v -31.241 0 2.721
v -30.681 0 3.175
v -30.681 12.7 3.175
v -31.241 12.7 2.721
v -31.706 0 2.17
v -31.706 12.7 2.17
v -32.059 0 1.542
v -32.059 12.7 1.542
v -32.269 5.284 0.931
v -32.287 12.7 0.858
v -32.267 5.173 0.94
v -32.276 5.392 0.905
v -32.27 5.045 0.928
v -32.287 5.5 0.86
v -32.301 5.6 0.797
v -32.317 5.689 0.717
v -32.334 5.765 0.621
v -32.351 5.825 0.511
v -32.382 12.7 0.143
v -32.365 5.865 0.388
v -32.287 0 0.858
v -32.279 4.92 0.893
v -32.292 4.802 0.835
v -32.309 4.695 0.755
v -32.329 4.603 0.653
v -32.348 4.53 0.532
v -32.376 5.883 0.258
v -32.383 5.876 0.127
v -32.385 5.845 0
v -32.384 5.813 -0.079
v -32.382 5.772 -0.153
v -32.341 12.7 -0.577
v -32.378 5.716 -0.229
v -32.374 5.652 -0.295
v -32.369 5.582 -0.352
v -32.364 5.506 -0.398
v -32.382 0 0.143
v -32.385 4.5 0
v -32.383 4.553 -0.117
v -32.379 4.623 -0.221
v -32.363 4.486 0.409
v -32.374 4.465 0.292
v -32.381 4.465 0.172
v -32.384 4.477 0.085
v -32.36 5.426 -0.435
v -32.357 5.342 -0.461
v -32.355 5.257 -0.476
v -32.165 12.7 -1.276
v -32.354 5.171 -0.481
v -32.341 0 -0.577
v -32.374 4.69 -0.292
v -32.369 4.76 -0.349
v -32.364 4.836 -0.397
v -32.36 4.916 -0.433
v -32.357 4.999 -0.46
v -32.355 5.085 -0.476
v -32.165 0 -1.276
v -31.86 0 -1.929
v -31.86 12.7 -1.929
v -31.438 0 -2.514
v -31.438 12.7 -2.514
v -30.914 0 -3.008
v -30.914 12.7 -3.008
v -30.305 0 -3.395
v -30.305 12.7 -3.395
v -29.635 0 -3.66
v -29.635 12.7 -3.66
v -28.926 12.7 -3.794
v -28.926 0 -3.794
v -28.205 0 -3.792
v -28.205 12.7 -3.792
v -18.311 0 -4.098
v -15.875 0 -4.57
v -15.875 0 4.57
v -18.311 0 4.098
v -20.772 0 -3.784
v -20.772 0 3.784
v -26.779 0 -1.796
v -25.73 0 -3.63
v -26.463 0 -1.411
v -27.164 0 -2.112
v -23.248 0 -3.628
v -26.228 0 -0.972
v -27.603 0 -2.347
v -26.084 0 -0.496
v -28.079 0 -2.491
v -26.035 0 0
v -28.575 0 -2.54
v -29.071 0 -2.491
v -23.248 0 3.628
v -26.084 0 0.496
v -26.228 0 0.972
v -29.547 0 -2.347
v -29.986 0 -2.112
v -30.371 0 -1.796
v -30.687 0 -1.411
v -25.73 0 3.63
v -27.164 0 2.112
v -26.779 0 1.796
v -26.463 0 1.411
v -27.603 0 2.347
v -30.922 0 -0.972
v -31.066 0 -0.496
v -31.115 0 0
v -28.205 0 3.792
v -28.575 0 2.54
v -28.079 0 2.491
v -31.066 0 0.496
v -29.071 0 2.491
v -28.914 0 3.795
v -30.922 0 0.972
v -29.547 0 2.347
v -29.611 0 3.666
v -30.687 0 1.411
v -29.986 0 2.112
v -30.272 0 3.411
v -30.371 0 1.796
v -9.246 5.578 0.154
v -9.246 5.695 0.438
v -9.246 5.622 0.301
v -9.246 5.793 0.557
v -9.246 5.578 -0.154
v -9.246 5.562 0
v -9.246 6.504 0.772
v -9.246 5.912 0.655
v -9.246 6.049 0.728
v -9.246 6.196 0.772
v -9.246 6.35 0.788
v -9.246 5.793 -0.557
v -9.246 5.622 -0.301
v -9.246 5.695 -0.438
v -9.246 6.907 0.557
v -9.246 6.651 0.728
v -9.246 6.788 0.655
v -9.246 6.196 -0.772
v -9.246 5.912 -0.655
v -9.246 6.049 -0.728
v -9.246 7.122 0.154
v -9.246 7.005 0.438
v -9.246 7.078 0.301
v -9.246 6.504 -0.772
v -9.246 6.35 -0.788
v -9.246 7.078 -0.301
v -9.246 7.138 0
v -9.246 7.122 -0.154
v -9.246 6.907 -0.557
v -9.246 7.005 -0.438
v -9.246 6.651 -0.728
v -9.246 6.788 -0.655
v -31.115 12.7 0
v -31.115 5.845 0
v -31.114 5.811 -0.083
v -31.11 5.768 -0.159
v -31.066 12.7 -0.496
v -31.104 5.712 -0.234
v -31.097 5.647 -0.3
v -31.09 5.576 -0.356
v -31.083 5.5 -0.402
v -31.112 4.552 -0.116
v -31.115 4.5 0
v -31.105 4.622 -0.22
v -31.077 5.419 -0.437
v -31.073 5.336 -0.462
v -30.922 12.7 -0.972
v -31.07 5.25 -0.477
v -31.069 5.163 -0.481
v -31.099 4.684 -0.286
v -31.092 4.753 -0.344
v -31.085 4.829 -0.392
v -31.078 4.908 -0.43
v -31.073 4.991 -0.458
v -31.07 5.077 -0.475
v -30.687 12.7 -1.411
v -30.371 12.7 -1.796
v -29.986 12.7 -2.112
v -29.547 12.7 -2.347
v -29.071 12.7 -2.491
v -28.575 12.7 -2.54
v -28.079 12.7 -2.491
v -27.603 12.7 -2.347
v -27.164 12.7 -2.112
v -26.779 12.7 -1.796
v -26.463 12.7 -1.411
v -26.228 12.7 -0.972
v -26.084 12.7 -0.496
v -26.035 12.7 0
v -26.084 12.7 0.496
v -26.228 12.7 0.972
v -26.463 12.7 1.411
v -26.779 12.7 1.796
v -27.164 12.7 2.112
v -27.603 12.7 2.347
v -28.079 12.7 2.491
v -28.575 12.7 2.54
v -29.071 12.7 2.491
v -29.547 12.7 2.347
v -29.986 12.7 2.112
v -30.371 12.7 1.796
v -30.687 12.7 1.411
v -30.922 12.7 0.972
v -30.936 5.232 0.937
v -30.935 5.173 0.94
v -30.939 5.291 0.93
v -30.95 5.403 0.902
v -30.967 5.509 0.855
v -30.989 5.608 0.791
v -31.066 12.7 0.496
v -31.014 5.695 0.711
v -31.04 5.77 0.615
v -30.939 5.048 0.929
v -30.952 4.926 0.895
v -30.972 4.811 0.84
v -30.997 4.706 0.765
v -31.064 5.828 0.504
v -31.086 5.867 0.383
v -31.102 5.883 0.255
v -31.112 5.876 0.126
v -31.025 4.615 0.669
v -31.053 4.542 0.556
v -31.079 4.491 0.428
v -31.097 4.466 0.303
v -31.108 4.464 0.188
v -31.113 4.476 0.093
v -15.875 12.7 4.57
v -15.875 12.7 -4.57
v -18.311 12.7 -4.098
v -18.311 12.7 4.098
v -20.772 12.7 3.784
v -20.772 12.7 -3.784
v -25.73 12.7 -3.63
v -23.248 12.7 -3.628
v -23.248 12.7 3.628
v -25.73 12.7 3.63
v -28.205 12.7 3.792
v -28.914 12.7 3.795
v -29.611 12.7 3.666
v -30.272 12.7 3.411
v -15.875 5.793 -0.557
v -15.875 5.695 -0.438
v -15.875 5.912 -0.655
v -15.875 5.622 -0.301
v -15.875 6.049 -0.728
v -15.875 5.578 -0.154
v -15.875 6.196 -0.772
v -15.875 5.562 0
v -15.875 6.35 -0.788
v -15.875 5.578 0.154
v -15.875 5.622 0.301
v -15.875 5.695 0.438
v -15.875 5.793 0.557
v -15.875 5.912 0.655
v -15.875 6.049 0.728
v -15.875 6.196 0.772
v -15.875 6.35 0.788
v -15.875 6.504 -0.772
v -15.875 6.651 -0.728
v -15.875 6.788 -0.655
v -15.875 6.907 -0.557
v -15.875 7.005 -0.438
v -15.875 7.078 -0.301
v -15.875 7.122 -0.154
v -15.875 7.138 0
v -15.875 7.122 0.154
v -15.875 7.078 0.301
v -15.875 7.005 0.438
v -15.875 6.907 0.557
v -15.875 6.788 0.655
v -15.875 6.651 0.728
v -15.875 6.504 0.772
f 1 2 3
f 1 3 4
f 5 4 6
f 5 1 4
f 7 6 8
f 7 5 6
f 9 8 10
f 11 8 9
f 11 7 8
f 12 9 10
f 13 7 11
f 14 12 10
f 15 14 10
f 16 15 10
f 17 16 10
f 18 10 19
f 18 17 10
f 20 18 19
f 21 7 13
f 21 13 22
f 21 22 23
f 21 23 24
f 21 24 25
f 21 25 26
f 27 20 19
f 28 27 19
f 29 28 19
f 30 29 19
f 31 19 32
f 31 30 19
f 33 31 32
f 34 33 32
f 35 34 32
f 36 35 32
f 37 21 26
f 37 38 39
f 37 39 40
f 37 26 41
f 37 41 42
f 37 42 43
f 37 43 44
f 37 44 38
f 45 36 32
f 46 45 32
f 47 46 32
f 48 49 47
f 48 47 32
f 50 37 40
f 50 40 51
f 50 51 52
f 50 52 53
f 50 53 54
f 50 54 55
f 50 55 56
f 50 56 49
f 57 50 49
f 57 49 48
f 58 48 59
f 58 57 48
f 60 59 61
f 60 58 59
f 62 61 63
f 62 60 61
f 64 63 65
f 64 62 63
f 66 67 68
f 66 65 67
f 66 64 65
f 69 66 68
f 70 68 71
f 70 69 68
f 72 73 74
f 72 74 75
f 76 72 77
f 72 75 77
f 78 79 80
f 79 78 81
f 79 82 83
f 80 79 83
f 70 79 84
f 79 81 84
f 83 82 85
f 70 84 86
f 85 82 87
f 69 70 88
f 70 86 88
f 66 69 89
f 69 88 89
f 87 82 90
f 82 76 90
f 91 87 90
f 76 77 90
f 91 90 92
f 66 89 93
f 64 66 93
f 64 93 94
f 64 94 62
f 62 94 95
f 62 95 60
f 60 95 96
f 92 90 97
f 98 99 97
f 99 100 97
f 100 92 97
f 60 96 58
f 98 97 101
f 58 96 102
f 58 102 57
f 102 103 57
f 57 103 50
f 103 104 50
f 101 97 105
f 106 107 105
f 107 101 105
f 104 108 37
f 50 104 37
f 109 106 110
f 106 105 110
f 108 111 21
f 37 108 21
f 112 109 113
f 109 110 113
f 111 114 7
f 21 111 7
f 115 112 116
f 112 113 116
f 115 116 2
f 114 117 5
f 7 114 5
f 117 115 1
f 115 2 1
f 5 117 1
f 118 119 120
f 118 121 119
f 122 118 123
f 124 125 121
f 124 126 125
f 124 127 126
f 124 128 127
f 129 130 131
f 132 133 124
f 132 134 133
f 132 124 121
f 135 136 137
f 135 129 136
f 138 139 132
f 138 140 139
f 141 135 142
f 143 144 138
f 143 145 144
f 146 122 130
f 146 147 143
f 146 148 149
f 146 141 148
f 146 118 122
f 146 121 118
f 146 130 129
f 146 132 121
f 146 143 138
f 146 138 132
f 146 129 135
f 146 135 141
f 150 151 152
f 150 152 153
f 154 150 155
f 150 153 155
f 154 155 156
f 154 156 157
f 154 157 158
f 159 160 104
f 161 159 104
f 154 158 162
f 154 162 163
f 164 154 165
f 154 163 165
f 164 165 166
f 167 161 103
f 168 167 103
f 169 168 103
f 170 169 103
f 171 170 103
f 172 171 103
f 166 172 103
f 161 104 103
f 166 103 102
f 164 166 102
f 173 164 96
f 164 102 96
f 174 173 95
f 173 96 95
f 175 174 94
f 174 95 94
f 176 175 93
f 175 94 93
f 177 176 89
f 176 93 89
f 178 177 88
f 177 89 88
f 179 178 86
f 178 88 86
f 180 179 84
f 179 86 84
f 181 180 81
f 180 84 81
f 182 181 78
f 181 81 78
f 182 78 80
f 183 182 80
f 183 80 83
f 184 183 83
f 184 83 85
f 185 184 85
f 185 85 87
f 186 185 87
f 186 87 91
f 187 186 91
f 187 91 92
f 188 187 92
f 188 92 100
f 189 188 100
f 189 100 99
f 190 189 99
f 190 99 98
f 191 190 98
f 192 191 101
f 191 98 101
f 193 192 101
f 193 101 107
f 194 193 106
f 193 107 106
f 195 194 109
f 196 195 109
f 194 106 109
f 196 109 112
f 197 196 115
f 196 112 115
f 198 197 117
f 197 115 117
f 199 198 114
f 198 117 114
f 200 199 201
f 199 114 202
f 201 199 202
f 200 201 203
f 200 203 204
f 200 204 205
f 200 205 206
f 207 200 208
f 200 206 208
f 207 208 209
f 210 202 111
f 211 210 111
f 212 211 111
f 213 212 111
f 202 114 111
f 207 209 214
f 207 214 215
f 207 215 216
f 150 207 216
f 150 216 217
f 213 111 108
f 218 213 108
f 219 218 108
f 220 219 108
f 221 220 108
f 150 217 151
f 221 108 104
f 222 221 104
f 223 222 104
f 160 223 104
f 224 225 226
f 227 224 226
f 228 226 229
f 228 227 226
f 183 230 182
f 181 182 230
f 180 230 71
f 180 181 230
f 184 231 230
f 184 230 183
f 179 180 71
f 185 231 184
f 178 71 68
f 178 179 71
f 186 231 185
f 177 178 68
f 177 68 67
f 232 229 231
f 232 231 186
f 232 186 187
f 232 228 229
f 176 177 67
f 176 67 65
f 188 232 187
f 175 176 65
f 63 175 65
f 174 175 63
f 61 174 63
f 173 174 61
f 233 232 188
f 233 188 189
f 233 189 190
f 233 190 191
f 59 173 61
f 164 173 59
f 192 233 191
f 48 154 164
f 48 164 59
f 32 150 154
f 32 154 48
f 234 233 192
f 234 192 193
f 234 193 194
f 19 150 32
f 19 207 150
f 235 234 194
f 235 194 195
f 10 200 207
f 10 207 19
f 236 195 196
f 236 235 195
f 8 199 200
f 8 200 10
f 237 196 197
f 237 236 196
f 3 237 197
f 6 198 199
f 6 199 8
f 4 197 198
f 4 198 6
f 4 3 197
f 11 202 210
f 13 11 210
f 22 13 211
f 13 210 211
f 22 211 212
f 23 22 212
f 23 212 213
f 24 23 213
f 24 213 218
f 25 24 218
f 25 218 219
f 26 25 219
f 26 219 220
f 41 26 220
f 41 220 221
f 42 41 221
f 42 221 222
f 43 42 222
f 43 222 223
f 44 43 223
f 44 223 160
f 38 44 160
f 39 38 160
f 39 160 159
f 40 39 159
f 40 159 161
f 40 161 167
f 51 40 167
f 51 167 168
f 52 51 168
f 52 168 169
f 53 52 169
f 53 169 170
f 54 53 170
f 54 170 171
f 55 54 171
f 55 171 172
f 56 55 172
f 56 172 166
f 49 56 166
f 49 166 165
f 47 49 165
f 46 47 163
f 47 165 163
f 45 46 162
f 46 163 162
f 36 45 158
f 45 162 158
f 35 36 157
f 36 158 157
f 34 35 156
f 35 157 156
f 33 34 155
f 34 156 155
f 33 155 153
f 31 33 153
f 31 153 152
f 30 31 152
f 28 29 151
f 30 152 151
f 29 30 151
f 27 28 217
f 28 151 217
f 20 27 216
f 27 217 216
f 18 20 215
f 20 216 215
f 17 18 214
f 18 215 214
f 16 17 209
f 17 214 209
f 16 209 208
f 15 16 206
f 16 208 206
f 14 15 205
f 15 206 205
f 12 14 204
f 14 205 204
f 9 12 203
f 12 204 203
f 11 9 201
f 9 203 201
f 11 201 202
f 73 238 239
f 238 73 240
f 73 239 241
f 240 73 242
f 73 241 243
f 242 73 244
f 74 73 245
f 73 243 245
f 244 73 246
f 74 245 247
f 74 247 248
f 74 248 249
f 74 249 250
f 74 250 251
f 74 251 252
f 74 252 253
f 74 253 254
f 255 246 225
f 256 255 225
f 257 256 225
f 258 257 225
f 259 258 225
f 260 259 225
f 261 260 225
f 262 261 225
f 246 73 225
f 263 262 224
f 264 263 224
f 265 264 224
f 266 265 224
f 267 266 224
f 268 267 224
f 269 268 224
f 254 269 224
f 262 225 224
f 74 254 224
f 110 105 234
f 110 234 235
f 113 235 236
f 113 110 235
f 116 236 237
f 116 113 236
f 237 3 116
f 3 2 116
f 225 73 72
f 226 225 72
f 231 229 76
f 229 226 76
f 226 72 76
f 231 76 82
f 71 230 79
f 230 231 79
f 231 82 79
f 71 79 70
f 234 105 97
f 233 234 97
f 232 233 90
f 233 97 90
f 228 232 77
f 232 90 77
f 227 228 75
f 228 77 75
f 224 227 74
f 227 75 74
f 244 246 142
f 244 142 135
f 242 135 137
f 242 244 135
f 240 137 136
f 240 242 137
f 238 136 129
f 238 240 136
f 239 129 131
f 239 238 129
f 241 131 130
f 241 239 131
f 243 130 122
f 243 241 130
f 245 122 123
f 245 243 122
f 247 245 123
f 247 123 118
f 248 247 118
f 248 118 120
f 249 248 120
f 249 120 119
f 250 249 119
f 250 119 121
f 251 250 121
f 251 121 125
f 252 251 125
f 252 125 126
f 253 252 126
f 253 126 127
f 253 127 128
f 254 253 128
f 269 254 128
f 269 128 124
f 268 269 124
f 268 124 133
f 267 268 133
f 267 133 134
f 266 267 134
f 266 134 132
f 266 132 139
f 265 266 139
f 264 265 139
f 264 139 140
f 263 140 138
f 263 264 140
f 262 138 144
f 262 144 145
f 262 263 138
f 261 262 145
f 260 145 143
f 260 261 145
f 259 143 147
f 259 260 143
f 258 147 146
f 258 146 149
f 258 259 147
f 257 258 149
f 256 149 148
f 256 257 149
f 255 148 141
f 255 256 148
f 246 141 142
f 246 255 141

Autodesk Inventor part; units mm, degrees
ref_plane "YZ Plane" through (0, 0, 0) normal (1, 0, 0) x (0, 1, 0)
ref_plane "XZ Plane" through (0, 0, 0) normal (0, 1, 0) x (-1, 0, 0)
sketch "Sketch1" plane through (0, 0, 0) normal (0, 1, 0) x (-1, 0, 0)
  line L0 (0, 0) -> (28.575, 0)
  line L1 (28.575, 0) -> (0, 0)
  line L2 (0, 0) -> (-14.2875, -24.7467)
  line L3 (0, 0) -> (28.575, 0) construction
  line L4 (0, 0) -> (-14.2875, 24.7467)
  line L5 (0, 0) -> (28.575, 0) construction
  circle A0 centre (28.575, 0) radius 2.54
  circle A1 centre (-14.2875, -24.7467) radius 2.54
  circle A2 centre (-14.2875, 24.7467) radius 2.54
  circle A3 centre (0, 0) radius 3.175
  circle A4 centre (0, 0) radius 6.35
  line L6 (-1.5875, -2.7496) -> (0, 0)
  line L7 (0, 0) -> (-6.35, 0)
  circle A5 centre (-14.2875, 24.7467) radius 3.81
  circle A6 centre (28.575, 0) radius 3.81
  circle A7 centre (-14.2875, -24.7467) radius 3.81
  line L8 (30.6811, 3.175) -> (-12.1814, 27.9217)
  line L9 (28.2054, -3.792) -> (-10.8187, -26.3226)
  line L10 (-18.0975, 24.7467) -> (-18.0975, -24.7467)
  line L11 (0, 0) -> (5.0525, -8.8146)
  line L12 (0, 0) -> (5.1463, 8.7602)
  line L13 (0, 0) -> (-10.16, 0)
  arc A8 (28.2054, -3.792) -> (-10.8187, -26.3226) centre (24.4473, -42.344) ccw
  arc A9 (-10.8187, 26.3226) -> (28.2054, 3.792) centre (24.4473, 42.344) ccw
  arc A10 (-17.3867, -22.5305) -> (-17.3867, 22.5305) centre (-48.8947, 0) ccw
  point P0 (5.1074, 8.7829)
  point P1 (-10.16, 0.0317)
  point P2 (30.2716, 3.4114)
  point P3 (28.2054, 3.792)
  point P4 (-10.8187, 26.3226)
  point P5 (-17.3867, 22.5305)
  point P6 (-17.3867, -22.5305)
  dimension "d9" = 6.35
  dimension "d41" = 12.7
  dimension "d0" = 28.575
  dimension "d1" = 28.575
  dimension "d2" = 120
  dimension "d3" = 28.575
  dimension "d4" = 120
  dimension "d5" = 5.08
  dimension "d6" = 5.08
  dimension "d7" = 5.08
  dimension "d42" = 7.62
  dimension "d43" = 7.62
  dimension "d44" = 7.62
  dimension "d47" = 10.16
  dimension "d48" = 10.16
  dimension "d49" = 10.16
  dimension "d52" = 360
extrude "Extrusion4" add sketch "Sketch1" along normal blind 12.7 contours A3 L12 A4 L0 | L0 A4 L11 A3 | A3 L11 A4 L2 | L2 A4 L7 A3 | A3 L7 A4 L4 | L4 A4 L12 A3 | A4 L12 A9 A6 L0 | L0 A6 A8 L11 A4 | A4 L11 A8 A7 L2 | L2 A7 A10 L13 A4 | A4 L13 A10 A5 L4 | L4 A5 A9 L12 A4 | A6 L8 | A7 | A5 picked at (31.8987, 0.5122)
sketch "Sketch8" plane through (0, 12.7, 0) normal (0, 1, 0) x (1, 0, 0)
  circle A0 centre (0.678, -11.6167) radius 3.175 projected
  circle A1 centre (9.1268, -7.2186) radius 3.175 projected
  circle A2 centre (0.678, -11.6167) radius 3.175 projected
  circle A3 centre (9.1268, -7.2186) radius 3.175 projected
  line L0 (5.0649, -17.2561) -> (12.4117, -13.0144)
  arc A4 (17.3867, 22.5305) -> (17.3867, -22.5305) centre (48.8947, 0) ccw projected
  circle A5 centre (14.2875, -24.7467) radius 2.54 projected
  line L1 (0, 0) -> (14.2875, -24.7467)
  arc A6 (10.8187, -26.3226) -> (-28.2054, -3.792) centre (-24.4473, -42.344) ccw projected
  arc A7 (10.8187, -26.3226) -> (17.3867, -22.5305) centre (14.2875, -24.7467) ccw projected
  line L2 (9.1268, -7.2186) -> (10.7143, -9.9682)
  line L3 (9.1268, -7.2186) -> (7.5393, -4.4689)
  line L4 (0.678, -11.6167) -> (-0.9095, -8.867)
  line L5 (0.678, -11.6167) -> (2.2655, -14.3663)
  line L6 (-0.9095, -8.867) -> (-4.4671, -10.921)
  line L7 (2.2655, -14.3663) -> (-2.6369, -17.1967)
  line L8 (7.5393, -4.4689) -> (12.4407, -1.6391)
  line L9 (10.7143, -9.9682) -> (17.8581, -5.8438)
  point P0 (11.3663, -9.5918)
  point P1 (11.3414, -9.4937)
  point P2 (10.4005, -4.3102)
  point P3 (10.2682, -2.8934)
  point P4 (-0.9095, -8.867)
  point P5 (-3.012, -10.0809)
  point P6 (2.1732, -14.2063)
extrude "Extrusion5" cut sketch "Sketch8" against normal through all contours A0 A6 L5 L4 | L4 L5 A6 A0 | A0 A6 L6 | A0 L5 A6 | L3 L2 A1 | L8 A4 A1 | A1 A4 L2 L3 | A1 A4 L9 | A1 A4 picked at (2.2194, -14.2744)
sketch "Sketch11" plane through (0, 12.7, 0) normal (0, 1, 0) x (1, 0, 0)
  arc A0 (10.8187, -26.3226) -> (2.3124, -14.3387) centre (-24.4473, -42.344) ccw projected
  arc A1 (11.3663, -9.5918) -> (17.3867, -22.5305) centre (48.8947, 0) ccw projected
  arc A2 (10.8187, -26.3226) -> (17.3867, -22.5305) centre (14.2875, -24.7467) ccw projected
  line L0 (0, 0) -> (14.2875, -24.7467)
  circle A3 centre (14.2875, -24.7467) radius 2.54 projected
  line L1 (14.2875, -24.7467) -> (8.2579, -14.3032)
  line L2 (14.2875, -24.7467) -> (7.9375, -13.7482)
  line L3 (7.9375, -13.7482) -> (11.895, -11.4633)
  line L4 (7.9375, -13.7482) -> (3.98, -16.033)
  circle A4 centre (14.2875, 24.7467) radius 2.54 projected
  line L5 (0, 0) -> (14.2875, 24.7467)
  line L6 (14.2875, 24.7467) -> (7.9375, 13.7482)
  line L7 (7.9375, 13.7482) -> (0, 0)
  circle A5 centre (-28.575, 0) radius 2.54 projected
  line L8 (0, 0) -> (-28.575, 0)
  line L9 (-28.575, 0) -> (-15.875, 0)
  line L10 (-15.875, 0) -> (-15.875, 4.5698)
  arc A6 (-28.2054, 3.792) -> (10.8187, 26.3226) centre (-24.4473, 42.344) ccw projected
  line L11 (-15.875, 0) -> (-15.875, -4.5698)
  line L12 (7.9375, 13.7482) -> (3.98, 16.033)
  line L13 (7.9375, 13.7482) -> (11.895, 11.4633)
  arc A7 (17.3867, 22.5305) -> (10.2682, -2.8934) centre (48.8947, 0) ccw projected
  arc A8 (-28.2054, 3.792) -> (-30.6811, -3.175) centre (-28.575, 0) ccw projected
  arc A9 (-3.012, -10.0809) -> (-28.2054, -3.792) centre (-24.4473, -42.344) ccw projected
  arc A10 (-30.2716, -3.4114) -> (-28.2054, -3.792) centre (-28.575, 0) ccw projected
  line L14 (-30.6811, -3.175) -> (-30.2716, -3.4114) projected
  arc A11 (17.3867, 22.5305) -> (10.8187, 26.3226) centre (14.2875, 24.7467) ccw projected
  line L15 (-3.012, -10.0809) -> (-0.9095, -8.867) projected
  arc A12 (2.3124, -14.3387) -> (-0.9095, -8.867) centre (0.678, -11.6167) ccw projected
  arc A13 (7.5393, -4.4689) -> (10.7143, -9.9682) centre (9.1268, -7.2186) ccw projected
  line L16 (11.3663, -9.5918) -> (10.7143, -9.9682) projected
  line L17 (7.5393, -4.4689) -> (10.2682, -2.8934) projected
  dimension "d65" = 12.7
  dimension "d66" = 12.7
  dimension "d67" = 12.7
extrude "Extrusion6" cut sketch "Sketch11" against normal blind 12.7 contours A0 A12 L15 A9 L11 L8 L0 L4 | L0 L5 L13 A7 L17 A13 L16 A1 L3 | L8 L10 A6 L12 L5
sketch "Sketch13" plane through (0, 12.7, 0) normal (0, 1, 0) x (1, 0, 0)
  arc A0 (-28.2054, 3.792) -> (-15.875, 4.5698) centre (-24.4473, 42.344) ccw projected
  arc A1 (-15.875, -4.5698) -> (-28.2054, -3.792) centre (-24.4473, -42.344) ccw projected
  line L0 (-15.875, -4.5698) -> (-15.875, 4.5698) projected
  arc A2 (-30.2716, -3.4114) -> (-28.2054, -3.792) centre (-28.575, 0) ccw projected
  arc A3 (-28.2054, 3.792) -> (-30.6811, -3.175) centre (-28.575, 0) ccw projected
  arc A4 (17.3867, 22.5305) -> (11.895, 11.4633) centre (48.8947, 0) ccw projected
  line L1 (3.98, 16.033) -> (11.895, 11.4633) projected
  arc A5 (3.98, 16.033) -> (10.8187, 26.3226) centre (-24.4473, 42.344) ccw projected
  arc A6 (17.3867, 22.5305) -> (10.8187, 26.3226) centre (14.2875, 24.7467) ccw projected
  arc A7 (11.895, -11.4633) -> (17.3867, -22.5305) centre (48.8947, 0) ccw projected
  line L2 (11.895, -11.4633) -> (3.98, -16.033) projected
  arc A8 (10.8187, -26.3226) -> (3.98, -16.033) centre (-24.4473, -42.344) ccw projected
  arc A9 (10.8187, -26.3226) -> (17.3867, -22.5305) centre (14.2875, -24.7467) ccw projected
  point P0 (0, 0)
extrude "Extrusion7" cut sketch "Sketch13" against normal blind 12.7
sketch "Sketch14" plane through (-15.875, 12.7, 4.5698) normal (1, 0, 0) x (0, 0, -1)
  line L0 (0, -12.7) -> (0, 0) projected
  line L1 (0, -6.35) -> (9.1395, -6.35)
  line L2 (9.1395, 0) -> (9.1395, -12.7) projected
  line L3 (2.0298, 0) -> (7.1098, 0) projected
  line L4 (4.5698, 0) -> (4.5698, -12.7)
  circle A0 centre (4.5698, -6.35) radius 0.7876
extrude "Extrusion8" add sketch "Sketch14" along normal blind 6.6294
thread "Thread1" size "2-56 UNC" class "2A" standard "ANSI Unified Screw Threads" full length
ref_plane "Work Plane1" through (-32.385, 0, 0) normal (1, 0, 0) x (0, 1, 0)
sketch "Sketch23" plane through (-32.385, 0, 0) normal (1, 0, 0) x (0, 1, 0)
  point P0 (0, 0)
  point P1 (5.1729, 0.2292)
hole "Hole5" at (-32.385, 5.1729, 0.2292) direction (1, 0, 0) diameter 1.4211 depth 5.715 thread size "M1.8x0.35" class "6H" standard "ISO Metric profile"
properties part number "backupstability"
